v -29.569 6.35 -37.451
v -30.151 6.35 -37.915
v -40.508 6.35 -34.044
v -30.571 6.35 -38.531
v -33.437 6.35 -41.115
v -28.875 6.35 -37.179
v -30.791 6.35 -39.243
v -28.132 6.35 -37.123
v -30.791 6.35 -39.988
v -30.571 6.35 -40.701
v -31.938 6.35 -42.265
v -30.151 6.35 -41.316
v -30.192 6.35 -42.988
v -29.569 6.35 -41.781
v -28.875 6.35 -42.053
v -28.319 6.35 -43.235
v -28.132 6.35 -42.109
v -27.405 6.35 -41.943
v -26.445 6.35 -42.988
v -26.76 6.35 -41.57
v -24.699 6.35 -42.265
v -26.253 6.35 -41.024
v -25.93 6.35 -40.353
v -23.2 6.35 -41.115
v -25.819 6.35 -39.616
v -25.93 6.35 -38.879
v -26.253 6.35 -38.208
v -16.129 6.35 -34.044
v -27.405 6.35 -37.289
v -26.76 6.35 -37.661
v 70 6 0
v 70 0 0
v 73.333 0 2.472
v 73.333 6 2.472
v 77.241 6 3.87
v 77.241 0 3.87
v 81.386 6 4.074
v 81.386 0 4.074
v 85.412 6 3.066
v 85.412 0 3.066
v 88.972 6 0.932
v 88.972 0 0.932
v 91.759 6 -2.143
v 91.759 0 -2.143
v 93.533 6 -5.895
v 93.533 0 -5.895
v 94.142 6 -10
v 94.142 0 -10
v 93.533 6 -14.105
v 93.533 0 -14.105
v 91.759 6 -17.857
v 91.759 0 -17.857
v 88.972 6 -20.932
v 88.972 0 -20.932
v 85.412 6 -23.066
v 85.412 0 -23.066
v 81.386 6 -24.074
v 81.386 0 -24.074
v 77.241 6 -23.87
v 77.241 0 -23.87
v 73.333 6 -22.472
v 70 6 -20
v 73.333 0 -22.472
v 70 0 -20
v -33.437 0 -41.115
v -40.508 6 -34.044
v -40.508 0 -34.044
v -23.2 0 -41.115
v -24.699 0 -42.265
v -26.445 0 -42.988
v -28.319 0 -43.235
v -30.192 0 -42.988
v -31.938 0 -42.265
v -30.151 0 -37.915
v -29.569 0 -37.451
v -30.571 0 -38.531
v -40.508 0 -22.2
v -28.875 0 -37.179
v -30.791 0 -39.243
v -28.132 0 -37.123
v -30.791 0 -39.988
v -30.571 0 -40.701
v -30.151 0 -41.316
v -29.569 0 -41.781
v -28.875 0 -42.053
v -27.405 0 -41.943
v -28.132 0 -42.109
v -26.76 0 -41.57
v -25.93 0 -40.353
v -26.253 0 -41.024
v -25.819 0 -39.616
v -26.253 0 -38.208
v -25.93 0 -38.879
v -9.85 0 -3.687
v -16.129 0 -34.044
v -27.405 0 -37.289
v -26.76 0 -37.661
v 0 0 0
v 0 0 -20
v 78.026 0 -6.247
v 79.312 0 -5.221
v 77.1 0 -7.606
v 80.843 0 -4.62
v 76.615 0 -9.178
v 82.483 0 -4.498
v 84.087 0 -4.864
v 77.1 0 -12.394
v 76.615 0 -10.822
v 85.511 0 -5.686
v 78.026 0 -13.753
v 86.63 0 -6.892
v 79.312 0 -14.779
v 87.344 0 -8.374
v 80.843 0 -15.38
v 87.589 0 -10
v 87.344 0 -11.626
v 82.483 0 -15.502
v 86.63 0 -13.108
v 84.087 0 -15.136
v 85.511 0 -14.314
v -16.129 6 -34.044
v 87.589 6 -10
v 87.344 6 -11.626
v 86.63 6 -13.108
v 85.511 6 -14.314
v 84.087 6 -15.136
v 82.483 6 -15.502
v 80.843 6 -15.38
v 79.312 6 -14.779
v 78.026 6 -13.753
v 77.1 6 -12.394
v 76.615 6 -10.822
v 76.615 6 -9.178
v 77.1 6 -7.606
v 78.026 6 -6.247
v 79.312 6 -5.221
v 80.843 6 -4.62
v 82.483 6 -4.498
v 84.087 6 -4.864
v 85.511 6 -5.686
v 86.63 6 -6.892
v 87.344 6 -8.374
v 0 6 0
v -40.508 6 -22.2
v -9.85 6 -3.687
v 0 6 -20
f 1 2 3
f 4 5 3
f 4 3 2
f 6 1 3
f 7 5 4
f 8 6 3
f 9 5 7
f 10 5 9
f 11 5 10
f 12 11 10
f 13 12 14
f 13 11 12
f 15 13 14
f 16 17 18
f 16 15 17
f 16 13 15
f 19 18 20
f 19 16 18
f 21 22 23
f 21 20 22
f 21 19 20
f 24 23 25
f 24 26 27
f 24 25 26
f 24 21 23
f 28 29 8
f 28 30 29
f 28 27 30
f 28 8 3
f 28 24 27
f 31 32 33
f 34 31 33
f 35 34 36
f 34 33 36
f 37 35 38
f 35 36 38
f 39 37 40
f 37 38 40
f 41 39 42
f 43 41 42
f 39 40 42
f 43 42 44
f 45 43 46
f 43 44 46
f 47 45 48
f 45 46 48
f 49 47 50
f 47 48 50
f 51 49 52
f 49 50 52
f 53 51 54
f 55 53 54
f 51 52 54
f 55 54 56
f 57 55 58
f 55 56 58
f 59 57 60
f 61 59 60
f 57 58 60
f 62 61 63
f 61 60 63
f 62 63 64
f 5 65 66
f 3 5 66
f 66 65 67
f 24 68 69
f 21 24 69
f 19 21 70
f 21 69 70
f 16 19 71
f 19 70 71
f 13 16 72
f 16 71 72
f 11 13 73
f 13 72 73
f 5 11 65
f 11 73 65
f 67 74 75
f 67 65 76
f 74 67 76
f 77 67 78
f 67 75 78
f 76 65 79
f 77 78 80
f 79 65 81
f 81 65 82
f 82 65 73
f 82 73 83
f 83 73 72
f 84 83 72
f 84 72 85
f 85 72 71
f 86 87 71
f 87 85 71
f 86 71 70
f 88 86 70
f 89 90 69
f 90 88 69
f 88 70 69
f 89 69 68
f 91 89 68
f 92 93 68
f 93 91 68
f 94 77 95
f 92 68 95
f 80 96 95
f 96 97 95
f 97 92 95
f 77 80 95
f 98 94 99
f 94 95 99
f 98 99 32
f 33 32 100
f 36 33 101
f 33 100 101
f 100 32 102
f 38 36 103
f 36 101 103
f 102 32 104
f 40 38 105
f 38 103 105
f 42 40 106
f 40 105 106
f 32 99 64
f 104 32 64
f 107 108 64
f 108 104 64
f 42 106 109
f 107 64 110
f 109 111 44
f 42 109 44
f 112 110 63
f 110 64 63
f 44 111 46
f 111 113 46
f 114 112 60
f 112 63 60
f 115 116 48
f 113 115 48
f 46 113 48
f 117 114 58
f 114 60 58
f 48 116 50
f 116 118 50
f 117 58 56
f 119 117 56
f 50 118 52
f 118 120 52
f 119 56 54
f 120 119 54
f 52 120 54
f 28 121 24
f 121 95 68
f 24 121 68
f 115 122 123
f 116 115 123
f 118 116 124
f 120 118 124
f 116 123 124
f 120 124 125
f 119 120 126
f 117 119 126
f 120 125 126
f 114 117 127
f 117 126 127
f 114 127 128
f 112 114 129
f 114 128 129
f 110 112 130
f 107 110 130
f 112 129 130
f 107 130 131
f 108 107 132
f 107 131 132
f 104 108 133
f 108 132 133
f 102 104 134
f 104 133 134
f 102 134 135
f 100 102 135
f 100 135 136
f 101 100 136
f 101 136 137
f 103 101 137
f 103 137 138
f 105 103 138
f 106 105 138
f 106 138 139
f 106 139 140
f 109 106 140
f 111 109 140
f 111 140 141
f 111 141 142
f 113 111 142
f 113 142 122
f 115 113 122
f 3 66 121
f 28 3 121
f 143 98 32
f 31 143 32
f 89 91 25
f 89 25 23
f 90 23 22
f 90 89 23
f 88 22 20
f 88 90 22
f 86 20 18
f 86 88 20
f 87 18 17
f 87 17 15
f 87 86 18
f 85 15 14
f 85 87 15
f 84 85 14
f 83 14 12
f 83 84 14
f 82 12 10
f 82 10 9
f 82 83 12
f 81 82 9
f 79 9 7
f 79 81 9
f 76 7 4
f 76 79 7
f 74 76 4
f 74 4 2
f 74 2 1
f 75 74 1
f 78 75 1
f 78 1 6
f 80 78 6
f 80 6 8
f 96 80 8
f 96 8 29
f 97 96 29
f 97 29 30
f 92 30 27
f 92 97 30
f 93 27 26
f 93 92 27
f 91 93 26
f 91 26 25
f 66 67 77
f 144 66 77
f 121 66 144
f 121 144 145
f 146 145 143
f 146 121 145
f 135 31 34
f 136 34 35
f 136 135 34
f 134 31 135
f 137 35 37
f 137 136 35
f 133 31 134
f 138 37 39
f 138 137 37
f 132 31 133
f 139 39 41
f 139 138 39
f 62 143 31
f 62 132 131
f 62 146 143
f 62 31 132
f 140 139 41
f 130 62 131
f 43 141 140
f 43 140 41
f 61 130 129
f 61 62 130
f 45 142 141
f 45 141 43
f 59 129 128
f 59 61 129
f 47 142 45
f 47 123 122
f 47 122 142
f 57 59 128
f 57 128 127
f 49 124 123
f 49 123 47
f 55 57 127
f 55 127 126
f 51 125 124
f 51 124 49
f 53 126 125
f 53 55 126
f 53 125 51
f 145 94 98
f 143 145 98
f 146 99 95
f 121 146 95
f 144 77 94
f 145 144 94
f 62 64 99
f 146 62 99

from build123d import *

# Parameters (mm, degrees)
BOSS_EXTRUDE1_DEPTH = 6
SKETCH2_R           = 5.5179
CUT_EXTRUDE1_DEPTH  = 6.35
SKETCH4_R           = 2.5
BOSS_EXTRUDE2_DEPTH = 6.35


with BuildPart() as part:
    # Sketch1 → Boss-Extrude1 (new body)
    with BuildSketch(Plane(origin=(0, 0, 0), x_dir=(1, 0, 0), z_dir=(0, 1, 0))):
        with BuildLine():
            Line((0, 0), (70, 0))
            ThreePointArc((70, 0), (94.142135624, 10), (70, 20))
            Line((70, 20), (0, 20))
            Line((0, 20), (-16.12909928, 34.043913387))
            Line((-16.12909928, 34.043913387), (-40.507954262, 34.043913387))
            Line((-40.507954262, 34.043913387), (-40.507954262, 22.199626998))
            Line((-40.507954262, 22.199626998), (-9.850111043, 3.6873826))
            Line((-9.850111043, 3.6873826), (0, 0))
        make_face()
    extrude(amount=BOSS_EXTRUDE1_DEPTH)

    # Sketch2 → Cut-Extrude1 (cut)
    with BuildSketch(Plane(origin=(0, 6, 0), x_dir=(1, 0, 0), z_dir=(0, 1, 0))):
        with Locations((82.071067812, 10)):
            Circle(SKETCH2_R)
    extrude(amount=-CUT_EXTRUDE1_DEPTH, mode=Mode.SUBTRACT)

    # Sketch4 → Boss-Extrude2 (add)
    with BuildSketch(Plane(origin=(0, 0, 0), x_dir=(1, 0, 0), z_dir=(0, 1, 0))):
        with BuildLine():
            Line((-16.12909928, 34.043913387), (-23.200167092, 41.114981199))
            ThreePointArc((-23.200167092, 41.114981199), (-28.318526771, 43.235075195), (-33.436886451, 41.114981199))
            Line((-33.436886451, 41.114981199), (-40.507954262, 34.043913387))
            Line((-40.507954262, 34.043913387), (-16.12909928, 34.043913387))
        make_face()
        with Locations((-28.318526771, 39.615848358)):
            Circle(SKETCH4_R, mode=Mode.SUBTRACT)
    extrude(amount=BOSS_EXTRUDE2_DEPTH)


solid = part.part
